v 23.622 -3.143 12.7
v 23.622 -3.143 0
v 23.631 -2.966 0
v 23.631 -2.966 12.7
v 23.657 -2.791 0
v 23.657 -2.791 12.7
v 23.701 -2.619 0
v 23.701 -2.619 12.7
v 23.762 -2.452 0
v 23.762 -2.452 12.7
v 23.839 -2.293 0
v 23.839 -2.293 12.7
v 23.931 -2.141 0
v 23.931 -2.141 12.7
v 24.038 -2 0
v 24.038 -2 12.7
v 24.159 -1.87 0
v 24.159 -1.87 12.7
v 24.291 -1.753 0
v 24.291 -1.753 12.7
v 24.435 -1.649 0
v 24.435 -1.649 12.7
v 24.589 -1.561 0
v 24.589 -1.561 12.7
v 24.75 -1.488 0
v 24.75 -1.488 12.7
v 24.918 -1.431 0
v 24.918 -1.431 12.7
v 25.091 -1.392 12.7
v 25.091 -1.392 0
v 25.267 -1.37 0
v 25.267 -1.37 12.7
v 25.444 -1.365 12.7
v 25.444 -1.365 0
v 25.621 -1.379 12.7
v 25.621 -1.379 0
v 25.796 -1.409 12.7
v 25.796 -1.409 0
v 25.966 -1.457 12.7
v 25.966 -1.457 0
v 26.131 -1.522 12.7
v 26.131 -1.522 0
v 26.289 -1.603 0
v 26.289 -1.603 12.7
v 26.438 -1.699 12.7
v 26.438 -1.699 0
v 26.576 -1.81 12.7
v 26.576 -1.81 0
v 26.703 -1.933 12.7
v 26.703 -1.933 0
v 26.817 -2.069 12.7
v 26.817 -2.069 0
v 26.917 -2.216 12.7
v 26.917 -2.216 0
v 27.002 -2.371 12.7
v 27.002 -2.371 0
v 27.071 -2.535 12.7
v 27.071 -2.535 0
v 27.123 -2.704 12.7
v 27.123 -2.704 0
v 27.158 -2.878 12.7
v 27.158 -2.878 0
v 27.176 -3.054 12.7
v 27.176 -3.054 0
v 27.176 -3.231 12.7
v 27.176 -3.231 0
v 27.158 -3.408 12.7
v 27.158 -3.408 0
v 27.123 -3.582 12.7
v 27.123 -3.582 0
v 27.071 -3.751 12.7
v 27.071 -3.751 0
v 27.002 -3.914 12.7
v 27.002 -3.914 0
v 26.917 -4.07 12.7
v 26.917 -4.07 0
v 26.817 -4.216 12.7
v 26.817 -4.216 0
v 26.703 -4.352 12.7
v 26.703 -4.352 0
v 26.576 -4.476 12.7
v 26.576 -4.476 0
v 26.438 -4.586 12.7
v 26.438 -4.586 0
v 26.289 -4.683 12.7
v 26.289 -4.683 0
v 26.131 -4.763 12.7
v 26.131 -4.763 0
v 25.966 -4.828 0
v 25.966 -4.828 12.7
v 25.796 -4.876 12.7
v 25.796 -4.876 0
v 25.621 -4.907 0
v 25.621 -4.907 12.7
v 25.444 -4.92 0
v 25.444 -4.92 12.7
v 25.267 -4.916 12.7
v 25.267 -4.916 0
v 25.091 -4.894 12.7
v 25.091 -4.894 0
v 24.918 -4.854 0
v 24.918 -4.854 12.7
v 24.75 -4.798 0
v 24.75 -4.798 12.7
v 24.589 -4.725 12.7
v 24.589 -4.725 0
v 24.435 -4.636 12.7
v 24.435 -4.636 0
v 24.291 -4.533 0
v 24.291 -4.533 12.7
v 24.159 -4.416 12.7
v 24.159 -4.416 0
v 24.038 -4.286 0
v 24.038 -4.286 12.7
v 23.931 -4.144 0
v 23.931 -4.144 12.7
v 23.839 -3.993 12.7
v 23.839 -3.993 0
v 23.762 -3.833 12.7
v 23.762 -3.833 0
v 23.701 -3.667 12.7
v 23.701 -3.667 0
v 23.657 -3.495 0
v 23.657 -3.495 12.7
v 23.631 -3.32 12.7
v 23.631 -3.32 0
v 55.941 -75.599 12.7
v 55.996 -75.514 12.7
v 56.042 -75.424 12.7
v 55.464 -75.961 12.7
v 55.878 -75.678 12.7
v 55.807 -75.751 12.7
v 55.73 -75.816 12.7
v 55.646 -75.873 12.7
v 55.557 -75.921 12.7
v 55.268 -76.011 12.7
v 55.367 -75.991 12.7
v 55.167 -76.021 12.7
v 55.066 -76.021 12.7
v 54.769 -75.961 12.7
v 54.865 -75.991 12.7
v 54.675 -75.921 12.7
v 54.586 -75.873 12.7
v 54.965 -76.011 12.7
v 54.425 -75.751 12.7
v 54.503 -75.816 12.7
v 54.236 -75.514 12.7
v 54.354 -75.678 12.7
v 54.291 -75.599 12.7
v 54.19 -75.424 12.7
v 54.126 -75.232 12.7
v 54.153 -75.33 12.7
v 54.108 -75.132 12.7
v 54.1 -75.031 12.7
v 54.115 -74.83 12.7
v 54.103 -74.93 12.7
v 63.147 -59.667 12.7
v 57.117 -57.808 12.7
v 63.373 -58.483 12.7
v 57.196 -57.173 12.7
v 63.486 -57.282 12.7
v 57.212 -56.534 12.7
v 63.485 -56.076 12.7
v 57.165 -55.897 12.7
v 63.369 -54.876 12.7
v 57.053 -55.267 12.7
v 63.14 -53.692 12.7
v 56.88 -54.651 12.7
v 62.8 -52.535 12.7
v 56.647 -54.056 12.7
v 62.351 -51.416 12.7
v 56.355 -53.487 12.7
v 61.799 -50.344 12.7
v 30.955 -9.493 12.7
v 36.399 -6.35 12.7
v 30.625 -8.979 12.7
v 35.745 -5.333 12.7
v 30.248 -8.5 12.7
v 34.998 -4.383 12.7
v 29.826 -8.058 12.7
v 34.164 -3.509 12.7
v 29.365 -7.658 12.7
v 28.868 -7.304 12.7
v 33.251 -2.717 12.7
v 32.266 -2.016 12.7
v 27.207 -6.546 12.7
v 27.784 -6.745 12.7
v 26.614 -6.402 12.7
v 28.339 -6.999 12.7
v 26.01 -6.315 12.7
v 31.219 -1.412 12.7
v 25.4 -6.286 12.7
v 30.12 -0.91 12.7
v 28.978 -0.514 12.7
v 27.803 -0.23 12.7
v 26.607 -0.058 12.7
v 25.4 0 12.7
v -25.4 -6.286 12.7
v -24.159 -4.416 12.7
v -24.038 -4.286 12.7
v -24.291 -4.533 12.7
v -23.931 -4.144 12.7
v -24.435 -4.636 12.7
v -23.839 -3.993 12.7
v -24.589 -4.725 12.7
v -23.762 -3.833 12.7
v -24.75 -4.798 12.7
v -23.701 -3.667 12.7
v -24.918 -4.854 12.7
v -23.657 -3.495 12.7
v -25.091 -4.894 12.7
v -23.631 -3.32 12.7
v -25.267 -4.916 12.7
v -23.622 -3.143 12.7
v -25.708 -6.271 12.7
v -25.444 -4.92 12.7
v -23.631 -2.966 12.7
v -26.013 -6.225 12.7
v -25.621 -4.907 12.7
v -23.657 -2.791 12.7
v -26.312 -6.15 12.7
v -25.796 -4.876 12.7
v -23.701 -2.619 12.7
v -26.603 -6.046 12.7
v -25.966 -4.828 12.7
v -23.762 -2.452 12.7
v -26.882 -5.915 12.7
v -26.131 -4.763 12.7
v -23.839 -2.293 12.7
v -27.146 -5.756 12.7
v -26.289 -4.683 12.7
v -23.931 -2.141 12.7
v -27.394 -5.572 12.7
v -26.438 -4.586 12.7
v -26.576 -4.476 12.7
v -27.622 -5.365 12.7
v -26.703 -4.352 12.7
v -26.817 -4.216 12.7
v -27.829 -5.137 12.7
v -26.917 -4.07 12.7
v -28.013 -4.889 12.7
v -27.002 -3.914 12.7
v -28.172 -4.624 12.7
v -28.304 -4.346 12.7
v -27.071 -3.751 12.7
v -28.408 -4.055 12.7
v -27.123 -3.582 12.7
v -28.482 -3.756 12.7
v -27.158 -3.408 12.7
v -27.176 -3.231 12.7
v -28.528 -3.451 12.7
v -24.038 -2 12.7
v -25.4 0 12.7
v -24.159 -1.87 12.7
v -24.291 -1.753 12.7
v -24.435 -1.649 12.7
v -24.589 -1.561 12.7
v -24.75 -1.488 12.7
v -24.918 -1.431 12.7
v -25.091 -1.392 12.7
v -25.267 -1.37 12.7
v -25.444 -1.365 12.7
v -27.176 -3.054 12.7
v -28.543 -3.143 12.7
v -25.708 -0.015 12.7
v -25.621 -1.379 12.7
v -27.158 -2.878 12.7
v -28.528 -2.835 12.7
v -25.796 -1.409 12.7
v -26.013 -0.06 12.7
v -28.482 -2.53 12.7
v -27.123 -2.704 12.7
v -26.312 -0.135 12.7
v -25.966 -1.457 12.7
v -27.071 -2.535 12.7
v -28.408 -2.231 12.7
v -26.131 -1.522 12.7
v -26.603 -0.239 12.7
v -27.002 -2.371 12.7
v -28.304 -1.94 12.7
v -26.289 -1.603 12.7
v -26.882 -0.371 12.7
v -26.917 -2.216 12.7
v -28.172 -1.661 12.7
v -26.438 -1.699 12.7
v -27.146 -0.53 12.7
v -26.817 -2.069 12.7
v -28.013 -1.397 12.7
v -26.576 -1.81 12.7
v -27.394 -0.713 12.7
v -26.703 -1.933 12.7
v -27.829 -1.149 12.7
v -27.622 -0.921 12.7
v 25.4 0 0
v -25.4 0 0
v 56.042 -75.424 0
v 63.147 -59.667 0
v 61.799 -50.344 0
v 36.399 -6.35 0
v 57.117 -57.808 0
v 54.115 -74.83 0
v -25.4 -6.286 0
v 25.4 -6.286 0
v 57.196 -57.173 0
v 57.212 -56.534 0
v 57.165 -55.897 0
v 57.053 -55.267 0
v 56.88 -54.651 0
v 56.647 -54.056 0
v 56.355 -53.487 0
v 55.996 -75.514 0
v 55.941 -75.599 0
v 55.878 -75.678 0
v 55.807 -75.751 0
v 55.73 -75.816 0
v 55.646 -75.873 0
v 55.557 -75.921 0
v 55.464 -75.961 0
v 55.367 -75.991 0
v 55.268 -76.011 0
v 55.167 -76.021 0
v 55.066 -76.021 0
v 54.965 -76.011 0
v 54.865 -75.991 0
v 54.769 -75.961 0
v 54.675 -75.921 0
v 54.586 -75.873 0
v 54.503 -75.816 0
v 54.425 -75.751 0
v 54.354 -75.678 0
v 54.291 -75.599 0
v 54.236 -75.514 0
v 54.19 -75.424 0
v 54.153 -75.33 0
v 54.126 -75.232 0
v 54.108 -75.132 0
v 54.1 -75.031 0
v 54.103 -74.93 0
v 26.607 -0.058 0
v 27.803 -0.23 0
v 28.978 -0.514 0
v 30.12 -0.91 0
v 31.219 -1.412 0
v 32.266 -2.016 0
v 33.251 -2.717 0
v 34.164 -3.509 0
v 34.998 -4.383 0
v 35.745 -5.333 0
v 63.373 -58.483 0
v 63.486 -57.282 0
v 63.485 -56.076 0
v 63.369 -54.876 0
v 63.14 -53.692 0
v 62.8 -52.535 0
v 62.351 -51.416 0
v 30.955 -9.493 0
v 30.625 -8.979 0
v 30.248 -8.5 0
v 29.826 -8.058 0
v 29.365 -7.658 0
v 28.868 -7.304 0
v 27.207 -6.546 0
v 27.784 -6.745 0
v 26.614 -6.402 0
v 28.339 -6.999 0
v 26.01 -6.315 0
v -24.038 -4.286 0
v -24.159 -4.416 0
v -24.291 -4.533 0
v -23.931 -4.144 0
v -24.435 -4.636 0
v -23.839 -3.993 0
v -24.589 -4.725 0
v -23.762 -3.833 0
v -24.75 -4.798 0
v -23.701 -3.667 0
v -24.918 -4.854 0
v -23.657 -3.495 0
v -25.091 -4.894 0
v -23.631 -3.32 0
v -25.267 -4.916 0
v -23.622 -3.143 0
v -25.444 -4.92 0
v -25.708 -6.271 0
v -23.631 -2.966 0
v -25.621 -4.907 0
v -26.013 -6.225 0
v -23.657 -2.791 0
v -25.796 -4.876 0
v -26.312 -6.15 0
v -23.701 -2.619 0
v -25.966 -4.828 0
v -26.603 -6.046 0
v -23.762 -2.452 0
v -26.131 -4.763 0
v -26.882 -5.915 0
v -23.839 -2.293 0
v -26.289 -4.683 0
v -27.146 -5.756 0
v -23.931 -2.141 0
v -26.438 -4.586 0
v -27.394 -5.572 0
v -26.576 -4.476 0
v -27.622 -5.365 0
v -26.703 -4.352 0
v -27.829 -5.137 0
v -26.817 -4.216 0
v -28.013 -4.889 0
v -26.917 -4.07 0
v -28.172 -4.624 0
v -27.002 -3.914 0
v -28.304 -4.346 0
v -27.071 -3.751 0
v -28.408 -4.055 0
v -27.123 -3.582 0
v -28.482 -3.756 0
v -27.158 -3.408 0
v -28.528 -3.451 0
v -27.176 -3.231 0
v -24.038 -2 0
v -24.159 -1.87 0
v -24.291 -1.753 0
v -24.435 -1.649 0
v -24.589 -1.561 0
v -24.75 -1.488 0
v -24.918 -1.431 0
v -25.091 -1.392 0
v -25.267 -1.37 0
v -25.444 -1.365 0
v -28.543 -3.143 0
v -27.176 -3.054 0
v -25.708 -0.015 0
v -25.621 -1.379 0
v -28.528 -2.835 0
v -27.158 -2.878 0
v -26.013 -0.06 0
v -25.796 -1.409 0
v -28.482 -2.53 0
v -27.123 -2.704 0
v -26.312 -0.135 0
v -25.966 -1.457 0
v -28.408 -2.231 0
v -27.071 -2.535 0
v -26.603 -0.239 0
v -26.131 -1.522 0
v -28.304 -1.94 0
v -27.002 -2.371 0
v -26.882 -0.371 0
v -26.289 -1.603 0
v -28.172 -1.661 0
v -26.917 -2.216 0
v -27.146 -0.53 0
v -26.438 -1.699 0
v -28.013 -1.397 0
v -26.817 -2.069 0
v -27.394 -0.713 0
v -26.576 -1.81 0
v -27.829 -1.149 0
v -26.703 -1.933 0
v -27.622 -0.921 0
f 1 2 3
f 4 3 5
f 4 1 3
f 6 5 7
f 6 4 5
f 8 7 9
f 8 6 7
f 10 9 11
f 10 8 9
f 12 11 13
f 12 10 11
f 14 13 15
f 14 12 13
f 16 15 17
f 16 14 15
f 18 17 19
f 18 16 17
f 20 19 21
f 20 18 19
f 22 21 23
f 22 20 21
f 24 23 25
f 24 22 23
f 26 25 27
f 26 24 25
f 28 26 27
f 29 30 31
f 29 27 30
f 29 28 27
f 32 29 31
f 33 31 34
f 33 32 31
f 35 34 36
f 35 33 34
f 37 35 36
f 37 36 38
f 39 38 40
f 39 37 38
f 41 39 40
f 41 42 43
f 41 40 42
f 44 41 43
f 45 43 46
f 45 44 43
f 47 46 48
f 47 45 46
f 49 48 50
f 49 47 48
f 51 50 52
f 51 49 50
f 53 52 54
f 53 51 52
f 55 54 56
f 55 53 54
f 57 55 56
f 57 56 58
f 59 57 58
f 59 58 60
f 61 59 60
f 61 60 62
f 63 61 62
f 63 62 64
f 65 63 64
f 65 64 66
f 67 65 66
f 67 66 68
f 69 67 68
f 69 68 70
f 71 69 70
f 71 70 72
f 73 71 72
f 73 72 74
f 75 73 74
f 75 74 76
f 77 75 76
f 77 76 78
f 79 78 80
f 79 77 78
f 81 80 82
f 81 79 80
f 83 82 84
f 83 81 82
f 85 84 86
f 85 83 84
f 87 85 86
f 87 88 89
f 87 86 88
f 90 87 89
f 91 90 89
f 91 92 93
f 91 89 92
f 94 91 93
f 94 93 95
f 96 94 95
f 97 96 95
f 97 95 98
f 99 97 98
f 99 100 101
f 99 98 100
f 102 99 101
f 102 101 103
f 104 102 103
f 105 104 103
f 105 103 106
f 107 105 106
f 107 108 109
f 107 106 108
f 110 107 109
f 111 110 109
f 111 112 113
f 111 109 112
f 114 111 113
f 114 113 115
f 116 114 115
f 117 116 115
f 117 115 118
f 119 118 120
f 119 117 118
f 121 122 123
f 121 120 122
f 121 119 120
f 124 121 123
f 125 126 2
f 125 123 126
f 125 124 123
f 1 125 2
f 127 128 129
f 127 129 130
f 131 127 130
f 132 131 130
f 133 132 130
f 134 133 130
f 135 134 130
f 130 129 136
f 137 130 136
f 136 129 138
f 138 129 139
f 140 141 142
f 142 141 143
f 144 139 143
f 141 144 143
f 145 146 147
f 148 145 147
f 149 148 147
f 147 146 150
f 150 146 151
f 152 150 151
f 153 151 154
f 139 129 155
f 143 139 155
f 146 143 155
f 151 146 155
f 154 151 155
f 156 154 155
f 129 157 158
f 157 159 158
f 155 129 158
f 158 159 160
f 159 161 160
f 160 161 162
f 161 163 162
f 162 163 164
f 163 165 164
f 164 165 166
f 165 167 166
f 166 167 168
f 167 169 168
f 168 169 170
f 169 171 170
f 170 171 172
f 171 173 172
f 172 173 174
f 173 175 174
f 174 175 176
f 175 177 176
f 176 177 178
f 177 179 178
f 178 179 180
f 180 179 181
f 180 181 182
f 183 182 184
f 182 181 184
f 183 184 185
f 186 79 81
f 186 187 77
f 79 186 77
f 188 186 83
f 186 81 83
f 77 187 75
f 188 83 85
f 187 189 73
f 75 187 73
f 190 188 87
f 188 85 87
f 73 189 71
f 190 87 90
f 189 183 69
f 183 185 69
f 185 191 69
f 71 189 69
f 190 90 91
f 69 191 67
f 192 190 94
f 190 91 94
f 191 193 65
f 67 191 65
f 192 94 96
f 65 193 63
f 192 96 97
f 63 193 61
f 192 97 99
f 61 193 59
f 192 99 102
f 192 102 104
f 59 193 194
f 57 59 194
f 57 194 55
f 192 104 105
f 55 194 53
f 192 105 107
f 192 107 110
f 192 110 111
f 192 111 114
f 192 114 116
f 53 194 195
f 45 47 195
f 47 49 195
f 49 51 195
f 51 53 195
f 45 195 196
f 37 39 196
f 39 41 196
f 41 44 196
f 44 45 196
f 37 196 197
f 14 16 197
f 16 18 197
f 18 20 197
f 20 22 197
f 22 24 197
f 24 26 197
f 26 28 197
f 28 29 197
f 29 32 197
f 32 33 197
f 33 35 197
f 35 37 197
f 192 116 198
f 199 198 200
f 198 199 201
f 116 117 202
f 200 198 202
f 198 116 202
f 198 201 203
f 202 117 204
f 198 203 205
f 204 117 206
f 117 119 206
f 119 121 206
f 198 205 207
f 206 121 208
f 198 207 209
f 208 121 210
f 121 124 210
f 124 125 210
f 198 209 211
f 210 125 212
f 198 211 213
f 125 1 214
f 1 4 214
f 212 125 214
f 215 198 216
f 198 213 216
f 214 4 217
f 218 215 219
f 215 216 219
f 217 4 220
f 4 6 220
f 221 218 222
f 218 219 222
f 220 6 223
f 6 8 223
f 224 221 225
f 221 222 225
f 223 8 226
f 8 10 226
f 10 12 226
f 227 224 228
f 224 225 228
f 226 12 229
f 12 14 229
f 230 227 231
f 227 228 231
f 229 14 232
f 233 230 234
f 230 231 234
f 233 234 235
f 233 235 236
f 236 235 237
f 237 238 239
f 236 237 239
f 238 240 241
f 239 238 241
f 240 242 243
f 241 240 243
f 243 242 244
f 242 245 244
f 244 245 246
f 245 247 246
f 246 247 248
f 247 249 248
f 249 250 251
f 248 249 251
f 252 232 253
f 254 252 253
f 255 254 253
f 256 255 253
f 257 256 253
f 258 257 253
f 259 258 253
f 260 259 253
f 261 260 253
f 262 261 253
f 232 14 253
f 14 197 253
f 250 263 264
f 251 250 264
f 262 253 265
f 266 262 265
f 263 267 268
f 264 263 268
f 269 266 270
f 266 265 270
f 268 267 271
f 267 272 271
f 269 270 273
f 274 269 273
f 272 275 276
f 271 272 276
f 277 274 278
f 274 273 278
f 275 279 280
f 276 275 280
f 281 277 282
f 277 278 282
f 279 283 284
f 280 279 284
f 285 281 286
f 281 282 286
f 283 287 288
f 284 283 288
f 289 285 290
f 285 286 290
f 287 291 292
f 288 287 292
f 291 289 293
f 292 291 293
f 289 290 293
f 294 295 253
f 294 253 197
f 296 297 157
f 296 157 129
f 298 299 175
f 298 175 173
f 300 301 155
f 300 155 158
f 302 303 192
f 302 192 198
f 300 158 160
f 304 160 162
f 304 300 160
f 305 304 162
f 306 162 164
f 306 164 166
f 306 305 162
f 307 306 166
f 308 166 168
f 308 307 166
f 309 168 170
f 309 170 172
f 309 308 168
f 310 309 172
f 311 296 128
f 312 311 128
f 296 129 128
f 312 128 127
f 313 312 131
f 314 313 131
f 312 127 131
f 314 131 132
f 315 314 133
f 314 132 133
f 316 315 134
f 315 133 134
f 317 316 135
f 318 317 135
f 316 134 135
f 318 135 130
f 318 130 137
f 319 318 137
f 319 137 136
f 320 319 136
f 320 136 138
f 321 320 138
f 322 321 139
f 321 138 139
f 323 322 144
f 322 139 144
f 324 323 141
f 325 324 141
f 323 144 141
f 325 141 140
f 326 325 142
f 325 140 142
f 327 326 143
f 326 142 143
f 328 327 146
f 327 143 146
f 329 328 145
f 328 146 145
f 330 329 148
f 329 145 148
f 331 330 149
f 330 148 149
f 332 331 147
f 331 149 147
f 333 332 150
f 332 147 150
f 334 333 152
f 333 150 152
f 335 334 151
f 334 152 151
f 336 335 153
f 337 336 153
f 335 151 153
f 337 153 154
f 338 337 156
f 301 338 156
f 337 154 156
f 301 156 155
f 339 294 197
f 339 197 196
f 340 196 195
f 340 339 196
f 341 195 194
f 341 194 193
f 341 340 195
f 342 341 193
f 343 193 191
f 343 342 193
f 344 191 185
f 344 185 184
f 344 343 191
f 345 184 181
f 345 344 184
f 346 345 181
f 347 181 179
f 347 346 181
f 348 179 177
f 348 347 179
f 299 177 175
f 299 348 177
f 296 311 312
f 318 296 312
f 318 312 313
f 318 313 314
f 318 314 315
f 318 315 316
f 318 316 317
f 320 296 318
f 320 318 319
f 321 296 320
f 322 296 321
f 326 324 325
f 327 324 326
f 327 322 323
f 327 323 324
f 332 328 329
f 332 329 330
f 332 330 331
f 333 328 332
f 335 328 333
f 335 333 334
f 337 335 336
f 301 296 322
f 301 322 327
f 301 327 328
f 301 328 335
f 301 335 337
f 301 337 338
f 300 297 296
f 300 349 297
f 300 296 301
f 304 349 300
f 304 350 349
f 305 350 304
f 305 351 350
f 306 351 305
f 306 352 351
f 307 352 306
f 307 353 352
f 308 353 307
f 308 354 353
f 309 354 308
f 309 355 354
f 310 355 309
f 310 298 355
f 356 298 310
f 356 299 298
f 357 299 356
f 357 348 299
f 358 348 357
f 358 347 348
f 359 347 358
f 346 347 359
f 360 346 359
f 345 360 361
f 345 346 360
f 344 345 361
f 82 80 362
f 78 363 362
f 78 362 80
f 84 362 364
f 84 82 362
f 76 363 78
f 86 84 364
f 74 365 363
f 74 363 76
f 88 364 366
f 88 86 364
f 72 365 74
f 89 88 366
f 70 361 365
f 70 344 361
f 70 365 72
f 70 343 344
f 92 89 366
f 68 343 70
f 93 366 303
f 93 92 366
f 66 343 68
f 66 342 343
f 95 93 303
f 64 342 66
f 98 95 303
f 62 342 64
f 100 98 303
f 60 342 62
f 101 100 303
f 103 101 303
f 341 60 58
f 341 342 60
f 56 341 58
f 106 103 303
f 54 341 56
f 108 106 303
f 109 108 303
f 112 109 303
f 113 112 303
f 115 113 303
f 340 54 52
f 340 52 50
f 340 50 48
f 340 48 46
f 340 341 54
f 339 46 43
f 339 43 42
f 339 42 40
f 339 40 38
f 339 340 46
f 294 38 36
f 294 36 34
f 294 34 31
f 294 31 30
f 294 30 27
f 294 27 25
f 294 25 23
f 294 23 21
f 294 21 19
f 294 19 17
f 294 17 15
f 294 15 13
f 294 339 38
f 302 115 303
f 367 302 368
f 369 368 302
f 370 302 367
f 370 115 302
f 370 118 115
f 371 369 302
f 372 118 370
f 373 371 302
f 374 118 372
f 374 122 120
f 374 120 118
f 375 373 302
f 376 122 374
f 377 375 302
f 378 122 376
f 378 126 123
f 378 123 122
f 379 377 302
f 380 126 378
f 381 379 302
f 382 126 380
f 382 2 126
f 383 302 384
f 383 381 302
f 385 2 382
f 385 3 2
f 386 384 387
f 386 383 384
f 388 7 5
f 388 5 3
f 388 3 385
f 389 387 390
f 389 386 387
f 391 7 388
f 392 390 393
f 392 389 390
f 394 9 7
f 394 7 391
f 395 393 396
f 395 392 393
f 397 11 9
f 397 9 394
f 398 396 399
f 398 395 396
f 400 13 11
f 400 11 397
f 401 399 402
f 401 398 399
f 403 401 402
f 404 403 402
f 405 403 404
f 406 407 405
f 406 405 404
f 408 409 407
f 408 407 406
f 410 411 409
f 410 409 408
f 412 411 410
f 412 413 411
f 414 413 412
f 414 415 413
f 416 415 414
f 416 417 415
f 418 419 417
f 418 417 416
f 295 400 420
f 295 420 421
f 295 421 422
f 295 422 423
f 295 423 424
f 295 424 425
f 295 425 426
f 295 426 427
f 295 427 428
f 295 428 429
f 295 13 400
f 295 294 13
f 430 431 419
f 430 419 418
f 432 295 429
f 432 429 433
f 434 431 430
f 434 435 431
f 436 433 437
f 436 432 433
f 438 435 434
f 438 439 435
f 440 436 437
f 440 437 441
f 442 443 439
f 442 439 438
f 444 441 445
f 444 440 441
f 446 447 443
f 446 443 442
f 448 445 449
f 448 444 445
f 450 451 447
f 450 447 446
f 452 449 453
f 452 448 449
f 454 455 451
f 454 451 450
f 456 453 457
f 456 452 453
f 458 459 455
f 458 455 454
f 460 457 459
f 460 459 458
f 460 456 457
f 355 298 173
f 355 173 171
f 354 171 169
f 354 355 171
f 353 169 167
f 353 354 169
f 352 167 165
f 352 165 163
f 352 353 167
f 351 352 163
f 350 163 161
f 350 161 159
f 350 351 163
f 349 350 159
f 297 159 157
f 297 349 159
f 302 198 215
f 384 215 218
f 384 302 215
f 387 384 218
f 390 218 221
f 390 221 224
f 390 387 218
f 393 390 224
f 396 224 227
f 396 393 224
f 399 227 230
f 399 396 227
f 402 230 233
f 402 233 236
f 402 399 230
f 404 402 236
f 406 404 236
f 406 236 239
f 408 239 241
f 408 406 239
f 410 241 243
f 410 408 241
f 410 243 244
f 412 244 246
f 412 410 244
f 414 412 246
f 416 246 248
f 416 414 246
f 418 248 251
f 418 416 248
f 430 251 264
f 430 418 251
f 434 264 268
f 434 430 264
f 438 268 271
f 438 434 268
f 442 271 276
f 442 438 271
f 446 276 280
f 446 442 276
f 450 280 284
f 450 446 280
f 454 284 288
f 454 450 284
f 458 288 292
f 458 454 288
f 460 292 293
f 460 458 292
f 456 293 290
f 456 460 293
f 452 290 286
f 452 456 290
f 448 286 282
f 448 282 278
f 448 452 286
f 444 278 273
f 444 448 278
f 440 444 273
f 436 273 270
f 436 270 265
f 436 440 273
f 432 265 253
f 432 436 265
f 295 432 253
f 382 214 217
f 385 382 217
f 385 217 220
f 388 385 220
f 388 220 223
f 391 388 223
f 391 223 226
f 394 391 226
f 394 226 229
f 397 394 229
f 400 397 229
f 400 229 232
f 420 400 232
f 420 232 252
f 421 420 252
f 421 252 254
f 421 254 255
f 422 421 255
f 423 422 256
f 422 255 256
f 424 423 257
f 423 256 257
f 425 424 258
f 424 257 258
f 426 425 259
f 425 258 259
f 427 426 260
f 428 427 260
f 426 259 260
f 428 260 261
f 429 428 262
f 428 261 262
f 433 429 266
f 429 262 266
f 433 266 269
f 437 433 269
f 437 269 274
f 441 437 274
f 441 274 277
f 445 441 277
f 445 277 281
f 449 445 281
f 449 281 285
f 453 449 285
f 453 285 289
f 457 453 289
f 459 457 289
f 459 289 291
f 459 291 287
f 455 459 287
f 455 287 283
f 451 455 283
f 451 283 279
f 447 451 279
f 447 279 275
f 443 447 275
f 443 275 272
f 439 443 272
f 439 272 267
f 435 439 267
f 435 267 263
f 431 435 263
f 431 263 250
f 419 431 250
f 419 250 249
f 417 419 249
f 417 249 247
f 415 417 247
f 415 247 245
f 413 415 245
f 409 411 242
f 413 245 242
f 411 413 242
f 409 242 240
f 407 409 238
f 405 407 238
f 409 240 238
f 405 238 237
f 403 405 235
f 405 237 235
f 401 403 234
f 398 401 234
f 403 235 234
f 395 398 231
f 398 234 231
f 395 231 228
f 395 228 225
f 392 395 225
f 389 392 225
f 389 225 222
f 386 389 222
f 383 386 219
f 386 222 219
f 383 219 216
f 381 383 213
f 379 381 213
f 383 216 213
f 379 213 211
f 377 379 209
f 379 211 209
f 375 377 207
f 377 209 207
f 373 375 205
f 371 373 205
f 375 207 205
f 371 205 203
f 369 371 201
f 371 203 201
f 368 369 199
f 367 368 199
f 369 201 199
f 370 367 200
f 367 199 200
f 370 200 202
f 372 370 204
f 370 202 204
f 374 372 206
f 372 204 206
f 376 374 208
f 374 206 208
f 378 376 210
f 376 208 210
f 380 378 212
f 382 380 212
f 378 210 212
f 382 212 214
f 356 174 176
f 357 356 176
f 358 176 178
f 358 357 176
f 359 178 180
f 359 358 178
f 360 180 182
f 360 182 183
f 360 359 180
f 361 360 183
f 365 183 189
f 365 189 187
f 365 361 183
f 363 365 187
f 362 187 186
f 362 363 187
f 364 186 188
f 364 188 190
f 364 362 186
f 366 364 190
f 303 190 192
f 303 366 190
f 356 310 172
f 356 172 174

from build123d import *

# Parameters (mm, degrees)
BOSS_EXTRUDE1_DEPTH = 12.7
SKETCH2_R           = 1.778
CUT_EXTRUDE1_DEPTH  = 106.13339417
FILLET1_R           = 1.016


with BuildPart() as part:
    # Sketch1 → Boss-Extrude1 (new body)
    with BuildSketch(Plane.XY):
        with BuildLine():
            Line((-25.4, 0), (25.4, 0))
            ThreePointArc((25.4, 0), (31.75, -1.701477372), (36.398522628, -6.35))
            Line((36.398522628, -6.35), (61.798522628, -50.344090512))
            ThreePointArc((61.798522628, -50.344090512), (63.369186559, -54.875973564), (63.147095217, -59.6671764))
            Line((63.147095217, -59.6671764), (52.706203541, -82.822041569))
            Line((52.706203541, -82.822041569), (57.116867254, -57.807924643))
            ThreePointArc((57.116867254, -57.807924643), (57.116867254, -55.580256382), (56.354959836, -53.486932956))
            Line((56.354959836, -53.486932956), (30.954959836, -9.492842444))
            ThreePointArc((30.954959836, -9.492842444), (28.607157556, -7.145040164), (25.4, -6.285684887))
            Line((25.4, -6.285684887), (-25.4, -6.285684887))
            ThreePointArc((-25.4, -6.285684887), (-28.542842444, -3.142842444), (-25.4, 0))
        make_face()
    extrude(amount=BOSS_EXTRUDE1_DEPTH)

    # Sketch2 → Cut-Extrude1 (cut, through all)
    with BuildSketch(Plane.XY.offset(12.7)):
        with Locations((-25.4, -3.142842444)):
            Circle(SKETCH2_R)
    cut_extrude1 = extrude(amount=-CUT_EXTRUDE1_DEPTH, mode=Mode.SUBTRACT)

    # Mirror1: Cut-Extrude1 across plane
    add(cut_extrude1.mirror(Plane(origin=(0, 0, 0), x_dir=(0, 0, 1), z_dir=(1, 0, 0))), mode=Mode.SUBTRACT)

    # Fillet1
    fillet1_edges = [part.edges().sort_by_distance(p)[0] for p in [
        (52.706203541, -82.822041569, 6.35),
    ]]
    fillet(fillet1_edges, radius=FILLET1_R)


solid = part.part
